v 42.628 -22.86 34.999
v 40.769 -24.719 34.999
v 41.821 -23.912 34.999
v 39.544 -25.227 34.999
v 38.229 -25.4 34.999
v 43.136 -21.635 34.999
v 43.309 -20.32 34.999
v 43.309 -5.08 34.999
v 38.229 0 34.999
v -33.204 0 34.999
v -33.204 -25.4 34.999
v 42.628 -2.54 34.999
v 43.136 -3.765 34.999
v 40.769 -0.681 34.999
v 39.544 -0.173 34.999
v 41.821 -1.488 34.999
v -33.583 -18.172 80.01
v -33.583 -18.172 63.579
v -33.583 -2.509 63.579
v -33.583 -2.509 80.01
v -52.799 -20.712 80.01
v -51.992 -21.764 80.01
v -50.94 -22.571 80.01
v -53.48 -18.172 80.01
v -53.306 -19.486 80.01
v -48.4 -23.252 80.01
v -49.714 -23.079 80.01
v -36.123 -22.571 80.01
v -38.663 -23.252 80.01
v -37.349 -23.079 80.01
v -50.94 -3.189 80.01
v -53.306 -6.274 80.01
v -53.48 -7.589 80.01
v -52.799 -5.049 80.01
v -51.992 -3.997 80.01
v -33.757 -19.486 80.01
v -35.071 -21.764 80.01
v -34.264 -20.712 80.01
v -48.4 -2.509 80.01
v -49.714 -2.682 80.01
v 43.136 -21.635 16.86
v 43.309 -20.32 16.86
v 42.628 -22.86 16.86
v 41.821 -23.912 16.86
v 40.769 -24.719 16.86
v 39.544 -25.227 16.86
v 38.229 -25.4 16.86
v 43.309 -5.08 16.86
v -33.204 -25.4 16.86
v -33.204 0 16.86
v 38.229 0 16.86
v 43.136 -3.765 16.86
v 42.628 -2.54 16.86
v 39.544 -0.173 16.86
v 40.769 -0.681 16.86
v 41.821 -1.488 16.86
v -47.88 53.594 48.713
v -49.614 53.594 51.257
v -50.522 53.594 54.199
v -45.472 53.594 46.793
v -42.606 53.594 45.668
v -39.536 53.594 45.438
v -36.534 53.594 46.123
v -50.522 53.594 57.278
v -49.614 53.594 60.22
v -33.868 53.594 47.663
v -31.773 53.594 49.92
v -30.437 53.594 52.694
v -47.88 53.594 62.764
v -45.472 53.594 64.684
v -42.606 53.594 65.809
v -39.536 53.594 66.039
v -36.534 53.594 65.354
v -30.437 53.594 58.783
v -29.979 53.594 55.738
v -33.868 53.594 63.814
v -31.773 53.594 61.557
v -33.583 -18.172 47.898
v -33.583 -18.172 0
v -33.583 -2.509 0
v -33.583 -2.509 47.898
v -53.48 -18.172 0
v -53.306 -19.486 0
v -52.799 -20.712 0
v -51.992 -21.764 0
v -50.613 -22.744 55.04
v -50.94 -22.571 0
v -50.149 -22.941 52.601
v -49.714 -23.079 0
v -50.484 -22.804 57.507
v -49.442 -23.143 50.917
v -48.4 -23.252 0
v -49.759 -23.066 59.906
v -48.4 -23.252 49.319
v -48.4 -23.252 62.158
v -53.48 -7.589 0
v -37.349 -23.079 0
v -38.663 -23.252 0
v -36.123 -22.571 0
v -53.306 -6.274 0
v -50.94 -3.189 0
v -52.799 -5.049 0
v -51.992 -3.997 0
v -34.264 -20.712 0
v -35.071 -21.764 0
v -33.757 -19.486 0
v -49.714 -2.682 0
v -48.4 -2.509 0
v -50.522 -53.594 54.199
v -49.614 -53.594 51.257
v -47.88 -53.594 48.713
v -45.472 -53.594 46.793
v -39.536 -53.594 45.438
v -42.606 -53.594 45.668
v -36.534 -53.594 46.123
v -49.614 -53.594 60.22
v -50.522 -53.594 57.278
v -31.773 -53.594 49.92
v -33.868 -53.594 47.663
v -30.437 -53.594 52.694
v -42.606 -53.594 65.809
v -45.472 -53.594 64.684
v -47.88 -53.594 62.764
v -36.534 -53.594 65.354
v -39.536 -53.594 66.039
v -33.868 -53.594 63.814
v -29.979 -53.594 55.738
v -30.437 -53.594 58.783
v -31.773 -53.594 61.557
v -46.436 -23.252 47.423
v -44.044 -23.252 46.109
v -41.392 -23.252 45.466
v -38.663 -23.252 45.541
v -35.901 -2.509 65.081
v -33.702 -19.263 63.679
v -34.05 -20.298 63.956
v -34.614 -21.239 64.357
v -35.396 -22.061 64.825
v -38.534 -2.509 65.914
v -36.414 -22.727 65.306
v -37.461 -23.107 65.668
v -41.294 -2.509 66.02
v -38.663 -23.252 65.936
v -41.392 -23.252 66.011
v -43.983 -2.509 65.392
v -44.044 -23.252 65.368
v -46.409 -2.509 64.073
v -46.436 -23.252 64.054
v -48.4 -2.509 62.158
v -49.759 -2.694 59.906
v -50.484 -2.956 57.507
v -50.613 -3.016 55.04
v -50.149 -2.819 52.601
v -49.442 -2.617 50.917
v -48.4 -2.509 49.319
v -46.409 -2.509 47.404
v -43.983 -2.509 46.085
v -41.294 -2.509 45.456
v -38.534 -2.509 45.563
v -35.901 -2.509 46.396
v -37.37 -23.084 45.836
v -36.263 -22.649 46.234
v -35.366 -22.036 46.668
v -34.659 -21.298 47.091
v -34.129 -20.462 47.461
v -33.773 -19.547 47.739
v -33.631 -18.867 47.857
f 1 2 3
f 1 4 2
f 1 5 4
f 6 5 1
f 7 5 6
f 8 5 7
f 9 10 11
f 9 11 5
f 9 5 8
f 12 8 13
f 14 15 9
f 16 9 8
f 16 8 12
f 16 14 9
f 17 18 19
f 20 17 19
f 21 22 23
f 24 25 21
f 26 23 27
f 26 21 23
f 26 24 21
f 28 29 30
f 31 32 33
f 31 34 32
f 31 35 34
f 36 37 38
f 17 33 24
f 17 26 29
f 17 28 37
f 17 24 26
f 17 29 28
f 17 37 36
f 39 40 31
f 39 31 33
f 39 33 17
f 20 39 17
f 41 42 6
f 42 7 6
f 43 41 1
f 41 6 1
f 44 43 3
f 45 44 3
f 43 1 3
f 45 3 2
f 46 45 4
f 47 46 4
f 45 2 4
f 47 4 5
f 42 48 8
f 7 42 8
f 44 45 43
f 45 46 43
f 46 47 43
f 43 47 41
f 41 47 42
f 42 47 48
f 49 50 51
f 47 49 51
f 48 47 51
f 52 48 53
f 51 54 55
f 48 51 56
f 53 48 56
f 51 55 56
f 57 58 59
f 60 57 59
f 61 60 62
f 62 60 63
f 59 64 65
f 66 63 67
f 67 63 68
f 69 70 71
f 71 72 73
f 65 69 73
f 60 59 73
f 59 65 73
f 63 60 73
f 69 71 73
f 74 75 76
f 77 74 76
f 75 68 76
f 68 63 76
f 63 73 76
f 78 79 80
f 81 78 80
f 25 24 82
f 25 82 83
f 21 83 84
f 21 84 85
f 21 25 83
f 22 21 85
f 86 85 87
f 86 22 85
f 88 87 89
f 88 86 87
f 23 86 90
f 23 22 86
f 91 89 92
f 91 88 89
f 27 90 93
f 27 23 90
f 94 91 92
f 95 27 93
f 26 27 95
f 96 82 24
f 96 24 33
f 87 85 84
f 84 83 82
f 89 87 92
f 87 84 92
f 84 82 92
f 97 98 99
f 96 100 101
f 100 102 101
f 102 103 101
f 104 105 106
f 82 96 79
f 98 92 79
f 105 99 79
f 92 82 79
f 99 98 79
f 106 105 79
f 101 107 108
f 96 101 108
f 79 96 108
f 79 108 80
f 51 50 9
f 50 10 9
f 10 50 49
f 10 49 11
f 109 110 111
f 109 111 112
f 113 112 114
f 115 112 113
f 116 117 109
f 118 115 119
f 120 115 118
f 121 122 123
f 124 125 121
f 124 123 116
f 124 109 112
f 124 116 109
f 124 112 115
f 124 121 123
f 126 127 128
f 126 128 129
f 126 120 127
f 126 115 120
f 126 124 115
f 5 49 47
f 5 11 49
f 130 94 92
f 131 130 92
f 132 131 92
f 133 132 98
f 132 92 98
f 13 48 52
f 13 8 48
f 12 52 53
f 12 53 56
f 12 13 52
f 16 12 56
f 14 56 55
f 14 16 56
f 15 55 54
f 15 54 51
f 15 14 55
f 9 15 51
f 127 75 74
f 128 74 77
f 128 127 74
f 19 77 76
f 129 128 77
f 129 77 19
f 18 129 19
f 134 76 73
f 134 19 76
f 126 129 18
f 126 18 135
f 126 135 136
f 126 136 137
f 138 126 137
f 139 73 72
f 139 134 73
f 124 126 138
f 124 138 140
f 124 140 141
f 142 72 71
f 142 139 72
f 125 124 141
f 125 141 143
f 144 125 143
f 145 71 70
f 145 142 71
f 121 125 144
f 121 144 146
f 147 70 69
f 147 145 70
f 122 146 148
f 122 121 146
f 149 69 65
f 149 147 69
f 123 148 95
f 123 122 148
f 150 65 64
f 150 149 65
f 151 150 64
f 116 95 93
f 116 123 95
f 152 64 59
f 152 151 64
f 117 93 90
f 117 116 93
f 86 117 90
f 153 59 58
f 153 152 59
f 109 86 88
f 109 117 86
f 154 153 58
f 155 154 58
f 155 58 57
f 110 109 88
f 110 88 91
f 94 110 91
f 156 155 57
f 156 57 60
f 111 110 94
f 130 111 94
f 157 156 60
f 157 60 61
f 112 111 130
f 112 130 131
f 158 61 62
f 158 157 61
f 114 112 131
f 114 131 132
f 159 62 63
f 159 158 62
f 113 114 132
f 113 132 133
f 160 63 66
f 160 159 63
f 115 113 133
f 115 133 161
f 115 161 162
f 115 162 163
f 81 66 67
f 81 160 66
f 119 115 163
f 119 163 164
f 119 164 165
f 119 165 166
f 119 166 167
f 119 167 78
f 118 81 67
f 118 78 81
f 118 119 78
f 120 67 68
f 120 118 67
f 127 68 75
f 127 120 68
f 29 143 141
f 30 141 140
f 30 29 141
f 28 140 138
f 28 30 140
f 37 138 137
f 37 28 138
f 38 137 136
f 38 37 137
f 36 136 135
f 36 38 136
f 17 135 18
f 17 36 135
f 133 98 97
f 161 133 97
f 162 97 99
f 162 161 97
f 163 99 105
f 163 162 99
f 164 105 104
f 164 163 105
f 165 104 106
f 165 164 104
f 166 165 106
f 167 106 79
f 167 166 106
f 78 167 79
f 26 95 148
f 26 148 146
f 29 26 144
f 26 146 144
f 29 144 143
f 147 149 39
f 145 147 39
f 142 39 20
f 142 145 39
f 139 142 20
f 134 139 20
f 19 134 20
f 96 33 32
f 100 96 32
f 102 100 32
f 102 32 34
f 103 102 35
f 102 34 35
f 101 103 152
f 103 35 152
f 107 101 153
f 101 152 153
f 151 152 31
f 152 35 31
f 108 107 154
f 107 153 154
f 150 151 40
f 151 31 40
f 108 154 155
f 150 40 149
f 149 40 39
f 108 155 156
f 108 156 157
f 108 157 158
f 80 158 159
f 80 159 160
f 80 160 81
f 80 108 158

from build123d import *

# Parameters (mm, degrees)
F0_W     = 76.513152
F0_H     = 18.138839
F1_DEPTH = 25.4
F2_W     = 19.896142
F2_H     = 20.742996
F3_DEPTH = 80.01
F4_R     = 5.08
F4_2_R   = 5.08
F5_R     = 10.329208
F6_DEPTH = 53.594


with BuildPart() as f1:
    # F0 (on Front) → F1 (new body)
    with BuildSketch(Plane.XZ):
        with Locations((5.05217, 25.929697)):
            Rectangle(F0_W, F0_H)
    extrude(amount=F1_DEPTH)

    # F4
    f4_edges = [f1.edges().sort_by_distance(p)[0] for p in [
        (43.308746, -25.4, 25.929698),
        (43.308746, 0, 25.929698),
    ]]
    fillet(f4_edges, radius=F4_R)


with BuildPart() as f3:
    # F2 (on Top) → F3 (new body)
    with BuildSketch(Plane.XY):
        with Locations((-43.531485, -12.880155)):
            Rectangle(F2_W, F2_H)
    extrude(amount=F3_DEPTH)

    # F4#2
    f4_2_edges = [f3.edges().sort_by_distance(p)[0] for p in [
        (-33.583414, -23.251653, 40.005),
        (-53.479556, -2.508657, 40.005),
        (-53.479556, -23.251653, 40.005),
    ]]
    fillet(f4_2_edges, radius=F4_2_R)

    # F5 (on Front) → F6 (join, symmetric)
    with BuildSketch(Plane.XZ):
        with Locations((-40.307764, 55.738453)):
            Circle(F5_R)
    extrude(amount=F6_DEPTH, both=True)


solid = Compound([f1.part, f3.part])
